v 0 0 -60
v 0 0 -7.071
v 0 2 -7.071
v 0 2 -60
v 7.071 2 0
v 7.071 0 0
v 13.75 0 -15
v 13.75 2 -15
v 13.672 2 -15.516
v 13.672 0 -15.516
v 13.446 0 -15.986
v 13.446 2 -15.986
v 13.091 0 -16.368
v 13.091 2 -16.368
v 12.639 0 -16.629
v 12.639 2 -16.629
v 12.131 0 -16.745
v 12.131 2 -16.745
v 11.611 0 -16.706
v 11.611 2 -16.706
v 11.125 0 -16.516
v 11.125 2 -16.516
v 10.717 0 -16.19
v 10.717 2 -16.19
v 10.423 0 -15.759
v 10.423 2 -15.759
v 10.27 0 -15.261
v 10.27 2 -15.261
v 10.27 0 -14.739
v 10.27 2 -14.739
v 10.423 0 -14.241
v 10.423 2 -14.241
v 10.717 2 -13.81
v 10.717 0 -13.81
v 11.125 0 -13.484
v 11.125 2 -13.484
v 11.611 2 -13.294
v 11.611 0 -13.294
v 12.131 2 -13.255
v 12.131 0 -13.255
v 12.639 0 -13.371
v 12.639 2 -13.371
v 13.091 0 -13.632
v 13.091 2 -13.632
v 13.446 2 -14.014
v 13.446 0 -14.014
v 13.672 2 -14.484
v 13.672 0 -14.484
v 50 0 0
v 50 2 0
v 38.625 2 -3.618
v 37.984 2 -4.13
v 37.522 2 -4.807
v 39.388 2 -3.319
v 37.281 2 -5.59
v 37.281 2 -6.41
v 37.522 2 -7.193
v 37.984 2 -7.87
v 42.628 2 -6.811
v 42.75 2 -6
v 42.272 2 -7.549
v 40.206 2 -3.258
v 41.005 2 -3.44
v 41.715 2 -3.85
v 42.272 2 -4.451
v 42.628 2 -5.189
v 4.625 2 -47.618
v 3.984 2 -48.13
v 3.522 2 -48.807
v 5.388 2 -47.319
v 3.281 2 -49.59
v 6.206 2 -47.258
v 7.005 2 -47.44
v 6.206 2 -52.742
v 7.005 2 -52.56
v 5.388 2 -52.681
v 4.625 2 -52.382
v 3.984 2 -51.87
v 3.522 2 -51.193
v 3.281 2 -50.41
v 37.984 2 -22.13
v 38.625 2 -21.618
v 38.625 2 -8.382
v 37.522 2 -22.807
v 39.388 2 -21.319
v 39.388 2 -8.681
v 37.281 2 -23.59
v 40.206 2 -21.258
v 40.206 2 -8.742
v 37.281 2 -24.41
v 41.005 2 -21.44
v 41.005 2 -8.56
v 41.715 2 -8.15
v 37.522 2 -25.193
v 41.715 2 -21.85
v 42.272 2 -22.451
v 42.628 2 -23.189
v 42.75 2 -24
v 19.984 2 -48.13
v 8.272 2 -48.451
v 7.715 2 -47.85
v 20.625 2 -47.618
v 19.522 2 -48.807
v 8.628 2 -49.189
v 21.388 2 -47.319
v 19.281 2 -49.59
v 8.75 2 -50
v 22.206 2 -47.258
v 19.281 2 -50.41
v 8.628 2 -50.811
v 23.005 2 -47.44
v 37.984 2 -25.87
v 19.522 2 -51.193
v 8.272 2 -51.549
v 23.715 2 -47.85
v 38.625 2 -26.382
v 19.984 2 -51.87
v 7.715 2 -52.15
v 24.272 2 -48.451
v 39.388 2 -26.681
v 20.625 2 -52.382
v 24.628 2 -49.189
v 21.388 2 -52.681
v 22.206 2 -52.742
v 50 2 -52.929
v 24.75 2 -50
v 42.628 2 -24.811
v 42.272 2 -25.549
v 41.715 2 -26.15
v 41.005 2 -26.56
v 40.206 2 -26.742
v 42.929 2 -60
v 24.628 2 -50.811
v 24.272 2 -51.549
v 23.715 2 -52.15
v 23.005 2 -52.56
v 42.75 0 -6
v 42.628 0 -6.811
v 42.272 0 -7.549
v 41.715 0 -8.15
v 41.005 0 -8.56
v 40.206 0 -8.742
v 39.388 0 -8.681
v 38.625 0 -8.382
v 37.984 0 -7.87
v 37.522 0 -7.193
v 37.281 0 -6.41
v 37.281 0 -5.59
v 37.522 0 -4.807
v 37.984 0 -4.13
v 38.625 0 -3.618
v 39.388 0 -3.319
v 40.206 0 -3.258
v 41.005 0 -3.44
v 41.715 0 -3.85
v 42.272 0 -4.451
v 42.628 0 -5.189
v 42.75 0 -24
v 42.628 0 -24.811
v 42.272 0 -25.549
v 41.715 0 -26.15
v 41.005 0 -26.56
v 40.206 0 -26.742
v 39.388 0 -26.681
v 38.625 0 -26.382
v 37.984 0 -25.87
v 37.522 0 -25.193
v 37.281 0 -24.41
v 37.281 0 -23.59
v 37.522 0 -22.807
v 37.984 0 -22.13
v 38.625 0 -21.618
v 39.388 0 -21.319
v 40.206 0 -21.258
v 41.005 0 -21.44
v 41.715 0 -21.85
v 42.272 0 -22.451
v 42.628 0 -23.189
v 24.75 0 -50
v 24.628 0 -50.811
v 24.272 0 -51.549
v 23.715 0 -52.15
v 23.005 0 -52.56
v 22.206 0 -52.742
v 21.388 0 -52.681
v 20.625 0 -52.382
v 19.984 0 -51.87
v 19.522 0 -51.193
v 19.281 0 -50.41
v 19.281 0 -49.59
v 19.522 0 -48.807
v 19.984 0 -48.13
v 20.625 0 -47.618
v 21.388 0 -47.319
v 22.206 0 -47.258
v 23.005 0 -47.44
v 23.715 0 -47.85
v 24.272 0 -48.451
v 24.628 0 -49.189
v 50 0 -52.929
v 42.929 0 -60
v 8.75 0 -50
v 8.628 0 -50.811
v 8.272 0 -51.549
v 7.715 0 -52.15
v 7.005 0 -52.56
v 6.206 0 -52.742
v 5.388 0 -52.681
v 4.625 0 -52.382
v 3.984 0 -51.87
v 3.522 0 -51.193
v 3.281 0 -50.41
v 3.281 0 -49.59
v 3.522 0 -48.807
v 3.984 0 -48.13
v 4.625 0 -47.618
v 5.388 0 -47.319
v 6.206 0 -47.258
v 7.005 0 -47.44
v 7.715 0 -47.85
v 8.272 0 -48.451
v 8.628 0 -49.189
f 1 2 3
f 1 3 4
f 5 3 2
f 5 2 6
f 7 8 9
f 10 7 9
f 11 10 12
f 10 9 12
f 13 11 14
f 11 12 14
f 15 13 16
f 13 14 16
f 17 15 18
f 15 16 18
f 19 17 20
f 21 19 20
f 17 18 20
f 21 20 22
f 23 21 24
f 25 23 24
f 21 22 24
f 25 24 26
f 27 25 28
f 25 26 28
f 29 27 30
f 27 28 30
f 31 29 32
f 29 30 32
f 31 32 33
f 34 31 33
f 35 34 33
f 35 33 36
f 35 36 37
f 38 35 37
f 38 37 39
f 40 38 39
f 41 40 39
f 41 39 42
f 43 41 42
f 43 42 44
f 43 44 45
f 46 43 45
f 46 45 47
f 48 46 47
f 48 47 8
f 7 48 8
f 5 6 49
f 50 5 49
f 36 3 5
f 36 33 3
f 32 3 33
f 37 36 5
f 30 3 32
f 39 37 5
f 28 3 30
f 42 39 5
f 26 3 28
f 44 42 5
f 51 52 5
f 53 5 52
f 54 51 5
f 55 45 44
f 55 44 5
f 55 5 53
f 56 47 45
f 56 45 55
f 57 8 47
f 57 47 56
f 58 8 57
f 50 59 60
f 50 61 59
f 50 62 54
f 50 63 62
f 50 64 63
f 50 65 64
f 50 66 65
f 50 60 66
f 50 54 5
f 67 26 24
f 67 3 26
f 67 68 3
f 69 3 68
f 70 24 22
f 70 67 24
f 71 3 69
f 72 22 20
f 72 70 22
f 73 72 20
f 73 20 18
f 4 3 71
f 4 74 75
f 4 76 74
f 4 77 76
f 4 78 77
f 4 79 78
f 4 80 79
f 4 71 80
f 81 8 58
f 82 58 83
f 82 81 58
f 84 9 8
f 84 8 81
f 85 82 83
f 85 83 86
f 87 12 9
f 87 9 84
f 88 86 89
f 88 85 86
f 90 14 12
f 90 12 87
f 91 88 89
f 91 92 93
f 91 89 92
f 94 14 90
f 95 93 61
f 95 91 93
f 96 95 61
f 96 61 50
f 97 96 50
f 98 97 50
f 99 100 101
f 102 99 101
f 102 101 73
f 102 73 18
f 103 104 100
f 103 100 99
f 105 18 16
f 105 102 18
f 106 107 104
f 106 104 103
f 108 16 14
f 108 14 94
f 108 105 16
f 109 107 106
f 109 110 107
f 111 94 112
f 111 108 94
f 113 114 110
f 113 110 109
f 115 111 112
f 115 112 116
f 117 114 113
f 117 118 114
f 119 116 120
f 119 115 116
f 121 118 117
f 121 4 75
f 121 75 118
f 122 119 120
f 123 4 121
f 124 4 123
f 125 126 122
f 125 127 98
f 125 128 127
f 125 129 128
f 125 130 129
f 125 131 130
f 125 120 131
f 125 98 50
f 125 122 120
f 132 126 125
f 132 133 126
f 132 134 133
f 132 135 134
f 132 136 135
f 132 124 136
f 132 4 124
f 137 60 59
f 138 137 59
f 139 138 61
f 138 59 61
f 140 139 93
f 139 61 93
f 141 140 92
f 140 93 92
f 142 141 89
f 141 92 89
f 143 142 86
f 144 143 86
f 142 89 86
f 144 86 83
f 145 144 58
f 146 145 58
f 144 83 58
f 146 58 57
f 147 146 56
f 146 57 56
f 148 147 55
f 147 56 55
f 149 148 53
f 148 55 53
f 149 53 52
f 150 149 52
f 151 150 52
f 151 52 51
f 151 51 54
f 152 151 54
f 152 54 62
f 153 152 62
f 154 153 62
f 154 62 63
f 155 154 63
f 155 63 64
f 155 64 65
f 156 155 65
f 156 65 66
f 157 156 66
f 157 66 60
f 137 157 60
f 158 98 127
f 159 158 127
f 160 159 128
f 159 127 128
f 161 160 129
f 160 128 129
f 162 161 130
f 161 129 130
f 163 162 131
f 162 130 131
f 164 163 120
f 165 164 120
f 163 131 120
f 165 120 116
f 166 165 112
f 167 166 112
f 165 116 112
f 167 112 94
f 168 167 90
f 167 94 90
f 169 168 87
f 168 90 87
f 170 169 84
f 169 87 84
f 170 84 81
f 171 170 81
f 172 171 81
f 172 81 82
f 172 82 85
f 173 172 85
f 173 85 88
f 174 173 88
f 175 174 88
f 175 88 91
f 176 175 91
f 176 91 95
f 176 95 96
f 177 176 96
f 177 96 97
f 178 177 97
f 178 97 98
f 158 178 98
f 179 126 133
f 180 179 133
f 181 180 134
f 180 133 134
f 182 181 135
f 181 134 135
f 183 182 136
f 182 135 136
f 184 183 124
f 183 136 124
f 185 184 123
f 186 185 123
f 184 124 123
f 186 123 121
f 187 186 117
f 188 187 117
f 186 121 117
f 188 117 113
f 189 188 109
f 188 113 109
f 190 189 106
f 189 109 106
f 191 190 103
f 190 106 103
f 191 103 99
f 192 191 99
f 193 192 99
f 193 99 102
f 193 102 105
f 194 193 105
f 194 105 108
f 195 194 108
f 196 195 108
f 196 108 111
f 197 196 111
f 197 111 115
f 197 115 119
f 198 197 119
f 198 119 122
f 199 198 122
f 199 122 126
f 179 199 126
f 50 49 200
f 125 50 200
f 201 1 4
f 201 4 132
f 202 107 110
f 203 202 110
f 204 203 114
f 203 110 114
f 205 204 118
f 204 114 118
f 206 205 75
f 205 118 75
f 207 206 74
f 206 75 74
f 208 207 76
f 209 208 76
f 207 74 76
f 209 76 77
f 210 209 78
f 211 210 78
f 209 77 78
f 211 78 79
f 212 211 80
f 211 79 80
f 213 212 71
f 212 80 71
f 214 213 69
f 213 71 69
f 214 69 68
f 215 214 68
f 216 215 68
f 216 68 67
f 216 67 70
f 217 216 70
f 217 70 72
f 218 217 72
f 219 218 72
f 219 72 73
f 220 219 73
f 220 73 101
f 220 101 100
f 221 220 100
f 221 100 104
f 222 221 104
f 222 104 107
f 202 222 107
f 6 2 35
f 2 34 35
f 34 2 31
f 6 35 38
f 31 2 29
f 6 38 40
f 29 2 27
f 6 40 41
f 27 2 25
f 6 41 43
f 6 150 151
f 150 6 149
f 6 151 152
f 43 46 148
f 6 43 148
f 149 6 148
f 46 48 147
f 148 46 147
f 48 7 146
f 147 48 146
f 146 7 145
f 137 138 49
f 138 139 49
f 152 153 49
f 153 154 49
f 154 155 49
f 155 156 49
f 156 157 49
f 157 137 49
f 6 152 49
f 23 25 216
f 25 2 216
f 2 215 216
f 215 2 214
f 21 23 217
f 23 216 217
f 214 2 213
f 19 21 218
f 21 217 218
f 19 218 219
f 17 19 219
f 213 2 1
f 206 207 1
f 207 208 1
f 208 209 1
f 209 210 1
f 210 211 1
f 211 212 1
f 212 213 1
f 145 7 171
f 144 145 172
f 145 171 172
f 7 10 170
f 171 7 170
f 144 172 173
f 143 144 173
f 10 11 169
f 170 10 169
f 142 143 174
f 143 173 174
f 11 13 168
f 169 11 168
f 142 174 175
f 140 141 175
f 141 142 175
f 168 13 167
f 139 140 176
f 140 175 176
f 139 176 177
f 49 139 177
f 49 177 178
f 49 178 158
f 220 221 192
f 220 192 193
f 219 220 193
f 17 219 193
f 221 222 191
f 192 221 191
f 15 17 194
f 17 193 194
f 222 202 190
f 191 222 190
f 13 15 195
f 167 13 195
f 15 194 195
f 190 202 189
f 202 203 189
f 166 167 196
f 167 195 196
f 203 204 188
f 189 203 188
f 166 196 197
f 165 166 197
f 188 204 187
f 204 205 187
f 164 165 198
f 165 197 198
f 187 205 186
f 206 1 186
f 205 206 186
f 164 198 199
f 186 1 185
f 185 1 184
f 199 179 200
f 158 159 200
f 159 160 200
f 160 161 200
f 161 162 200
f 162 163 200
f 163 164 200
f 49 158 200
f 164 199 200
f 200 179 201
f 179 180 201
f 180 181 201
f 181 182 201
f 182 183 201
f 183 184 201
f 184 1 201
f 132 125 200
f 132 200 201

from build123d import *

# Parameters (mm, degrees)
SKETCH_1_W          = 50
SKETCH_1_H          = 60
EXTRUDE_1_DEPTH     = 2
SKETCH_2_R          = 2.75
SKETCH_2_R_2        = 1.75
CUT_EXTRUDE_1_DEPTH = 3


with BuildPart() as part:
    # 草图1 → 凸台-拉伸1 (new body)
    with BuildSketch(Plane(origin=(0, 0, 0), x_dir=(1, 0, 0), z_dir=(0, 1, 0))):
        with Locations((25, 30)):
            Rectangle(SKETCH_1_W, SKETCH_1_H)
    extrude(amount=EXTRUDE_1_DEPTH)

    # 草图2 → 切除-拉伸1 (cut, through all)
    with BuildSketch(Plane(origin=(0, 2, 0), x_dir=(1, 0, 0), z_dir=(0, 1, 0))):
        with Locations((6, 50)):
            Circle(SKETCH_2_R)
        with Locations((40, 6)):
            Circle(SKETCH_2_R)
        with Locations((12, 15)):
            Circle(SKETCH_2_R_2)
        with Locations((40, 24)):
            Circle(SKETCH_2_R)
        with Locations((22, 50)):
            Circle(SKETCH_2_R)
        Polygon((0, 7.071067812), (7.071067812, 0), (0, 0), align=None)
        Polygon((50, 60), (50, 52.928932188), (42.928932188, 60), align=None)
    extrude(amount=-CUT_EXTRUDE_1_DEPTH, mode=Mode.SUBTRACT)


solid = part.part
